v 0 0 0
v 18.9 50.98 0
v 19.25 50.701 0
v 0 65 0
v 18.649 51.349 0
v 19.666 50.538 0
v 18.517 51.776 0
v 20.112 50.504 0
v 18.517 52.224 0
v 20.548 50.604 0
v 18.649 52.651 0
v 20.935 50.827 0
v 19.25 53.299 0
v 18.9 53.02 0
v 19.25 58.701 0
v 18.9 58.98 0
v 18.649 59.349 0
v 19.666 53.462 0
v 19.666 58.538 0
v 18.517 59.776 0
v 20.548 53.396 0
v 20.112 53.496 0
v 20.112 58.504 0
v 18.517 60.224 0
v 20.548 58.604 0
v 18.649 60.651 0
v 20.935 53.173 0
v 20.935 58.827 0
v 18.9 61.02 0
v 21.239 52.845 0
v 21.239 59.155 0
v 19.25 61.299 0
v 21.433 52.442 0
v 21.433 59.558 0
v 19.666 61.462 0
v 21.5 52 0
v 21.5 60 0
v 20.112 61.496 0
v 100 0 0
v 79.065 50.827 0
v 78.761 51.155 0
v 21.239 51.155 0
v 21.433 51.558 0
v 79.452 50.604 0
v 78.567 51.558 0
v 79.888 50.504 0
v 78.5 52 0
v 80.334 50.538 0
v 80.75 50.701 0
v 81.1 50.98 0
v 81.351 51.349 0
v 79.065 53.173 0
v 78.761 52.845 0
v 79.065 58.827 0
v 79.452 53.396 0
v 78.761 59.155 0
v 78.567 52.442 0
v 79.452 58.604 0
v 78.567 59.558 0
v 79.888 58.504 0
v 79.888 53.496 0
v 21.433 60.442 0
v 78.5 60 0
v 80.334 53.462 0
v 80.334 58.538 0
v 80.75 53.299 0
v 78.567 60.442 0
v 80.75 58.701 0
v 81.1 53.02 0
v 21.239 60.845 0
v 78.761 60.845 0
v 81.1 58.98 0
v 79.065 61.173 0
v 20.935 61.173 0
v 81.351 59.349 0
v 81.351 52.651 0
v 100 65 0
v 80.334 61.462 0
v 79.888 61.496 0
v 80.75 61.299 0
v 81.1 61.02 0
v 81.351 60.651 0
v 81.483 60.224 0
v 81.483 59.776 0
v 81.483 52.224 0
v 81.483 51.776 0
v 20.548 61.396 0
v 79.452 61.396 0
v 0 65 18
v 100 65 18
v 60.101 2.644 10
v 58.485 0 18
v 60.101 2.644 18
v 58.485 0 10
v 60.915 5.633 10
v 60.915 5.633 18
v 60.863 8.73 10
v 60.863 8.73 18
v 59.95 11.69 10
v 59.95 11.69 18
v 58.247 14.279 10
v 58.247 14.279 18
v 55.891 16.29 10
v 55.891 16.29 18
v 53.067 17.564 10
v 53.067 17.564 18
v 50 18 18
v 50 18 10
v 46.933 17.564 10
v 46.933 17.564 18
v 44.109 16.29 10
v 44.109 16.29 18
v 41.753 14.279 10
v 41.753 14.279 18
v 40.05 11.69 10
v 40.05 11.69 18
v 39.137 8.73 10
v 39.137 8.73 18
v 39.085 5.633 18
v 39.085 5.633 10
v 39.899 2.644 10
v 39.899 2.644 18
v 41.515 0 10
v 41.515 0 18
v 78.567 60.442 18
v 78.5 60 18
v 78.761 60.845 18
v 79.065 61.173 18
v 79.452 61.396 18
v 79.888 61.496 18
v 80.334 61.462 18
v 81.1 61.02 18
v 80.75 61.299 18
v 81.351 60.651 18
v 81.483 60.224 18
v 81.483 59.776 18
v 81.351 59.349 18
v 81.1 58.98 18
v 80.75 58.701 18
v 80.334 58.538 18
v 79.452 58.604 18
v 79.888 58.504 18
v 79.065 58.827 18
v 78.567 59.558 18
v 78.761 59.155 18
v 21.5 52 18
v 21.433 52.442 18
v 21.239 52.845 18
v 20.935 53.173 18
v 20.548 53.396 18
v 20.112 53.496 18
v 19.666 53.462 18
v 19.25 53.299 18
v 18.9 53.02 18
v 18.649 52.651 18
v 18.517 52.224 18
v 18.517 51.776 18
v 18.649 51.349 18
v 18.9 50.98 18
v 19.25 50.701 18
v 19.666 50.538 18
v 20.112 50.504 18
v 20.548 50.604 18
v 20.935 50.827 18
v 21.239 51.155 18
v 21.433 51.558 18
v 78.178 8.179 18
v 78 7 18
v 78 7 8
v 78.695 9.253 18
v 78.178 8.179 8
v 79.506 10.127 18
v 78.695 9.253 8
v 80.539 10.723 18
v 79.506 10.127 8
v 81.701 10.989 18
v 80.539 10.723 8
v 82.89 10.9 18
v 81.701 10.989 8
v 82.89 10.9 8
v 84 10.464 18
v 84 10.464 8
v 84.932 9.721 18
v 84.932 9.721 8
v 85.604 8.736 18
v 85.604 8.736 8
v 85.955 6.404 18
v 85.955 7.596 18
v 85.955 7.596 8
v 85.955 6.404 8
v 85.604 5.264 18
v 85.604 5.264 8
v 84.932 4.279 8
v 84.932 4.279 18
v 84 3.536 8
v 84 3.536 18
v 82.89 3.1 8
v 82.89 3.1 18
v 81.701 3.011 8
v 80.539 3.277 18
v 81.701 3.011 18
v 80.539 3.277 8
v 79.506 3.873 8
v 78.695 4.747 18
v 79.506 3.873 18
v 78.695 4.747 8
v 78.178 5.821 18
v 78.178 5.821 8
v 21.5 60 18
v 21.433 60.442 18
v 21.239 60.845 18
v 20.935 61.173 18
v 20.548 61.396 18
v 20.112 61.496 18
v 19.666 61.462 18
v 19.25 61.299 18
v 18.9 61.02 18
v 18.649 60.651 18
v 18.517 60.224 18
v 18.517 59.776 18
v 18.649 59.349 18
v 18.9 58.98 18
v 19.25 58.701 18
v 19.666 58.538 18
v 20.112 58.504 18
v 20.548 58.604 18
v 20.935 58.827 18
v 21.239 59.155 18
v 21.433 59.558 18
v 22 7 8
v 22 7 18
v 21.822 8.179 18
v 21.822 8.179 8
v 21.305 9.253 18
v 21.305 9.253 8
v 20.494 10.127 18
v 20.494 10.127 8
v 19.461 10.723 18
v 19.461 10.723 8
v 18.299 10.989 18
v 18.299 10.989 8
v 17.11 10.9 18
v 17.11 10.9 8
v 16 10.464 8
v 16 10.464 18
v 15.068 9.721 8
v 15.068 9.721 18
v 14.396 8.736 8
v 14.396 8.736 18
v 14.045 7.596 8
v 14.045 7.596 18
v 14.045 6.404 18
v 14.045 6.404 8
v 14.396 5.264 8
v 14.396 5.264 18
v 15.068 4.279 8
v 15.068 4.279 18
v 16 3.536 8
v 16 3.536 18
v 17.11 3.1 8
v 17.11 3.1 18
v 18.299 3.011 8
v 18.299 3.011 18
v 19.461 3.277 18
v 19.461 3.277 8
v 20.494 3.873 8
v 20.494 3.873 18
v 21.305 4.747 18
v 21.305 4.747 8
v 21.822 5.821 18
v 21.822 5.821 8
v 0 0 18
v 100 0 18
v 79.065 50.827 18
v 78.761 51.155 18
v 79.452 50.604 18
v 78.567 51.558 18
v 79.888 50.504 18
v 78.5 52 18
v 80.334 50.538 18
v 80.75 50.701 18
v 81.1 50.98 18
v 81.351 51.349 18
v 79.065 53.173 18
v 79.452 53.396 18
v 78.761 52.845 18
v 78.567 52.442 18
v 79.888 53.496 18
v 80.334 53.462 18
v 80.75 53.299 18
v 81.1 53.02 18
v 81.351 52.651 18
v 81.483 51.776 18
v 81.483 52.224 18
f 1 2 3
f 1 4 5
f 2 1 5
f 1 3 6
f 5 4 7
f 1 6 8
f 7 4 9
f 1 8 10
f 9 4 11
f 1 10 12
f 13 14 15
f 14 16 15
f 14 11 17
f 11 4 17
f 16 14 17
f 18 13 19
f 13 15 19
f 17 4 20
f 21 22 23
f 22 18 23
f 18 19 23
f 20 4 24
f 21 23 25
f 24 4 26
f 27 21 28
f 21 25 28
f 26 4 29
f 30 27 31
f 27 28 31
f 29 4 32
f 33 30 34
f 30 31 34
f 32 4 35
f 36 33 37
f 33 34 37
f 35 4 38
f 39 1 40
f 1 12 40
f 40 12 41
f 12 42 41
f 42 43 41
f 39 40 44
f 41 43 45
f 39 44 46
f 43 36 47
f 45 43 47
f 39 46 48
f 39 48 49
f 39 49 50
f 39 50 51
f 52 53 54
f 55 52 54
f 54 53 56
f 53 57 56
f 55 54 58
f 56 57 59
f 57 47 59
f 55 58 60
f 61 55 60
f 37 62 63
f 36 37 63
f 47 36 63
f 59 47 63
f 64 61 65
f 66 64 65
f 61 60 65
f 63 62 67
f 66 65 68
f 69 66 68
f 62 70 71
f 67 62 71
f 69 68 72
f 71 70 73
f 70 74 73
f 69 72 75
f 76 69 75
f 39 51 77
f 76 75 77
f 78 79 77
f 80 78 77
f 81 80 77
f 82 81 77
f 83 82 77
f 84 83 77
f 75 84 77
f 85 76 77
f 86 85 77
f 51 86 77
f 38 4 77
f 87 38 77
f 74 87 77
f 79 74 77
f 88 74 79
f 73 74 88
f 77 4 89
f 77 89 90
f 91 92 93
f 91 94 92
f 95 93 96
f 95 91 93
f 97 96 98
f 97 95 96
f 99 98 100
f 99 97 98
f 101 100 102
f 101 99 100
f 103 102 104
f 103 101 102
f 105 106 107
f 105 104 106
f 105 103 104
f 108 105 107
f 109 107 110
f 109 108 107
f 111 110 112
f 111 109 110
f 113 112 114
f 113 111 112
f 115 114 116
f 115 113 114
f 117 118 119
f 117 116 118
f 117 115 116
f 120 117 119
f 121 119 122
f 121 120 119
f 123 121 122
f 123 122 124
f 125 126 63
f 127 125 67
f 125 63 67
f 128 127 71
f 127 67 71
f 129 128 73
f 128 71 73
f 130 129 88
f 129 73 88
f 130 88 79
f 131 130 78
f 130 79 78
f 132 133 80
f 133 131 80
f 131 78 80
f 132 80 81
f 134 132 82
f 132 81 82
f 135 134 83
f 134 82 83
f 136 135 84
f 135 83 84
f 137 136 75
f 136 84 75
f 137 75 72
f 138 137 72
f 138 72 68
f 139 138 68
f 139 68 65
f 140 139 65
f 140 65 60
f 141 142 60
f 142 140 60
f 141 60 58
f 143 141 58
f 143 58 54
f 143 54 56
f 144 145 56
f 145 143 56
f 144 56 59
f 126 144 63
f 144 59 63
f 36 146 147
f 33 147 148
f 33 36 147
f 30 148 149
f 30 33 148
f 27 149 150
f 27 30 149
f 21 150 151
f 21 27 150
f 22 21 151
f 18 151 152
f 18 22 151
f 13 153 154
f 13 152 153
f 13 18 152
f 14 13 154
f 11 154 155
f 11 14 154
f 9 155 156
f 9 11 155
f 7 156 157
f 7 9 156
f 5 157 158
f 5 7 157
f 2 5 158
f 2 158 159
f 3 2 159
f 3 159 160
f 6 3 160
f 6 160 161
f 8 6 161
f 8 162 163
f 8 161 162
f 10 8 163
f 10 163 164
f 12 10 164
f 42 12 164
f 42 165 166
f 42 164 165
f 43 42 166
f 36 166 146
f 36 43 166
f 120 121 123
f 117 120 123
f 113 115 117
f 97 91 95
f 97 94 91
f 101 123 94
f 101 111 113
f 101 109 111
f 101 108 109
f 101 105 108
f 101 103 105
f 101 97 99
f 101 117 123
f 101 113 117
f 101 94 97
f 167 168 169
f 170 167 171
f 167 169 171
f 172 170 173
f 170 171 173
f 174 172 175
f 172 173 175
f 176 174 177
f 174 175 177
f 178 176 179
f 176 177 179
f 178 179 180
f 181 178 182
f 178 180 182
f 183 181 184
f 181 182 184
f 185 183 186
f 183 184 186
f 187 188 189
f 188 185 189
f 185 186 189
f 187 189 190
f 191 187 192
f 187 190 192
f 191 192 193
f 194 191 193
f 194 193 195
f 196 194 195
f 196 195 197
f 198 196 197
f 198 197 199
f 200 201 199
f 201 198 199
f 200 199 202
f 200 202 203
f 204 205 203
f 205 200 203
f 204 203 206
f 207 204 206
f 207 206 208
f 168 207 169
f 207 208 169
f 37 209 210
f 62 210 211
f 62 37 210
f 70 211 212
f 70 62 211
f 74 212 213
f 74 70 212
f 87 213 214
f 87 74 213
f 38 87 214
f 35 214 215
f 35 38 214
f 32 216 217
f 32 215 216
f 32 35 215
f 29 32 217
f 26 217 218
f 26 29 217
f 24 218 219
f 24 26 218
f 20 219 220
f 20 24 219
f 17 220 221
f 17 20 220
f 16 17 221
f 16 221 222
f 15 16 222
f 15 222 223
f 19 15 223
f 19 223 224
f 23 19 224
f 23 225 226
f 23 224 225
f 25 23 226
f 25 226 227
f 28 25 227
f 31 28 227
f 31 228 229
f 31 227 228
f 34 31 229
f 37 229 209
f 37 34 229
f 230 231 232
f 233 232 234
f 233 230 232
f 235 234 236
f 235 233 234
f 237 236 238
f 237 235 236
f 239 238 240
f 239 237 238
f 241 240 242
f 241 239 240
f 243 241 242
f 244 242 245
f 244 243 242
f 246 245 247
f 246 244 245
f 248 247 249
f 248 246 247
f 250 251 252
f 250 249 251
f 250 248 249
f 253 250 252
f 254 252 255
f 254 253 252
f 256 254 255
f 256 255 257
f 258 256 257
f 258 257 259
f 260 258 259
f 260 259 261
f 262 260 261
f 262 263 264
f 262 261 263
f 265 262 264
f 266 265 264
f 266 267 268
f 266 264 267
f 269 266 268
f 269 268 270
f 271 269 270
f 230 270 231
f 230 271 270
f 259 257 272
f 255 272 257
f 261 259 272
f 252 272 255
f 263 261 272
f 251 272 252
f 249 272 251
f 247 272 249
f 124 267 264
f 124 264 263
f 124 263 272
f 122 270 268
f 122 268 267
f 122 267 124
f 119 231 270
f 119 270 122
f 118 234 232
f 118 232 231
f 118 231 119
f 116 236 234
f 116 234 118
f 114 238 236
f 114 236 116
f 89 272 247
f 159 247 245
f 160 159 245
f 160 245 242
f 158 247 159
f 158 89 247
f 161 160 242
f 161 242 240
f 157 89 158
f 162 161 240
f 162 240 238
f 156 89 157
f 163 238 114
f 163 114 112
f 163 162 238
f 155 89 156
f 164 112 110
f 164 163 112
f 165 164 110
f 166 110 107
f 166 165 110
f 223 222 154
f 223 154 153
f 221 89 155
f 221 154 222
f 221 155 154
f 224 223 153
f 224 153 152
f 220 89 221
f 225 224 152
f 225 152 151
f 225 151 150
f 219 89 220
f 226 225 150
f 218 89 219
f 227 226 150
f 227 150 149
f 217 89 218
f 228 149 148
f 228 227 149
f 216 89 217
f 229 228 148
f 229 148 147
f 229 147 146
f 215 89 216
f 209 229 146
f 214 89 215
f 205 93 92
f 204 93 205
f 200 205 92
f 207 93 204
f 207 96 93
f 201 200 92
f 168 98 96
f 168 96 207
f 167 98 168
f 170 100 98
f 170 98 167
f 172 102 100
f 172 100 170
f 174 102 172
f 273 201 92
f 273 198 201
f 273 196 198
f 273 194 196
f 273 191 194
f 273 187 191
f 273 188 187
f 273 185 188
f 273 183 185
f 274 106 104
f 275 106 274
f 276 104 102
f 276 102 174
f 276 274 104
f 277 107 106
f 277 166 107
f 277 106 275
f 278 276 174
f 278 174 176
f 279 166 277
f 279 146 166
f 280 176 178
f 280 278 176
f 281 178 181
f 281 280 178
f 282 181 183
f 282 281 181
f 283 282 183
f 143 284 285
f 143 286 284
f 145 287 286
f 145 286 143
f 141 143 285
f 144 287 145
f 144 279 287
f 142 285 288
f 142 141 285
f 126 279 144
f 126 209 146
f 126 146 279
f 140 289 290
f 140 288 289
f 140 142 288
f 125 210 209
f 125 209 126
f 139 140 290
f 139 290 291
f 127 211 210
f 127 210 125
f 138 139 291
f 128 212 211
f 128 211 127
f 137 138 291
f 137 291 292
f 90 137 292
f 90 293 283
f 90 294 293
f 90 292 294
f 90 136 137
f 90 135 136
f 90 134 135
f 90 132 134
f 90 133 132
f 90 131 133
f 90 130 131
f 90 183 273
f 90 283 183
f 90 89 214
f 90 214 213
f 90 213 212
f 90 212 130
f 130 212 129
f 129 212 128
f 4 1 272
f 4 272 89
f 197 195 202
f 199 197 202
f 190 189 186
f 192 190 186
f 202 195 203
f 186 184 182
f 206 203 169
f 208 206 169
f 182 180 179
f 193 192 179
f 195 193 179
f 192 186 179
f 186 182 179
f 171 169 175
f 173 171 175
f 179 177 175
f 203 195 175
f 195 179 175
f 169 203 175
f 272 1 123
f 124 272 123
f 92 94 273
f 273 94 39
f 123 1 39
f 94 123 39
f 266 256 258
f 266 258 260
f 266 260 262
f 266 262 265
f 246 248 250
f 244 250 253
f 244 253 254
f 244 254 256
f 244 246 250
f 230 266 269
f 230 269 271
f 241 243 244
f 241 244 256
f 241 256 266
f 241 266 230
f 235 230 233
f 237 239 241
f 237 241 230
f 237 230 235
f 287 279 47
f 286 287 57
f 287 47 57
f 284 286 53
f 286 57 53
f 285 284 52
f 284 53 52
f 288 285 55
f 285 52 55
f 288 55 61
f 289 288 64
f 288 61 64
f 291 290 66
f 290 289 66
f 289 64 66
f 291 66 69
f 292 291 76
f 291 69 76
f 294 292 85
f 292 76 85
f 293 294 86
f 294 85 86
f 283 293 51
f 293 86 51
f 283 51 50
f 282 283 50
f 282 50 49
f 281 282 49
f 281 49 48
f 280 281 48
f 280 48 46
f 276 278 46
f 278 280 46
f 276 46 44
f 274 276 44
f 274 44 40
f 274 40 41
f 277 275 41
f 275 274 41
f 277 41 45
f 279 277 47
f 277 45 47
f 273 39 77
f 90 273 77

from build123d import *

# Parameters (mm, degrees)
CYLINDER003_R     = 11
CYLINDER003_DEPTH = 15
CYLINDER001_R     = 1.5
CYLINDER001_DEPTH = 25
CYLINDER_R        = 4
CYLINDER_DEPTH    = 25
CYLINDER002_R     = 1.5
CYLINDER002_DEPTH = 25
BOX_W             = 50
BOX_H             = 65
BOX_DEPTH         = 18


with BuildPart() as cilindro003:
    # Cylinder003 → Cylinder003 (new body)
    with BuildSketch(Plane(origin=(50, 7, 10), x_dir=(1, 0, 0), z_dir=(0, 0, 1))):
        Circle(CYLINDER003_R)
    extrude(amount=CYLINDER003_DEPTH)


with BuildPart() as cilindro001:
    # Cylinder001 → Cylinder001 (new body)
    with BuildSketch(Plane(origin=(20, 52, 0), x_dir=(1, 0, 0), z_dir=(0, 0, 1))):
        Circle(CYLINDER001_R)
    extrude(amount=CYLINDER001_DEPTH)


with BuildPart() as cilindro:
    # Cylinder → Cylinder (new body)
    with BuildSketch(Plane(origin=(18, 7, 8), x_dir=(1, 0, 0), z_dir=(0, 0, 1))):
        Circle(CYLINDER_R)
    extrude(amount=CYLINDER_DEPTH)


with BuildPart() as fusion:
    # Cylinder002 → Cylinder002 (new body)
    with BuildSketch(Plane(origin=(20, 60, 0), x_dir=(1, 0, 0), z_dir=(0, 0, 1))):
        Circle(CYLINDER002_R)
    extrude(amount=CYLINDER002_DEPTH)

    # Fusion: union Cilindro001, Cilindro
    add(cilindro001.part)
    add(cilindro.part)


with BuildPart() as izquierda:
    # Box → Box (new body)
    with BuildSketch(Plane.XY):
        with Locations((25, 32.5)):
            Rectangle(BOX_W, BOX_H)
    extrude(amount=BOX_DEPTH)

    # Cut: cut Fusion
    add(fusion.part, mode=Mode.SUBTRACT)


with BuildPart() as z_abajo:
    # mirror: instance of Izquierda
    add(izquierda.part.mirror(Plane(origin=(50, 0, 0), x_dir=(0, -1, 0), z_dir=(1, 0, 0))))

    # Fusion001: union Izquierda
    add(izquierda.part)

    # Cut001: cut Cilindro003
    add(cilindro003.part, mode=Mode.SUBTRACT)


solid = z_abajo.part
